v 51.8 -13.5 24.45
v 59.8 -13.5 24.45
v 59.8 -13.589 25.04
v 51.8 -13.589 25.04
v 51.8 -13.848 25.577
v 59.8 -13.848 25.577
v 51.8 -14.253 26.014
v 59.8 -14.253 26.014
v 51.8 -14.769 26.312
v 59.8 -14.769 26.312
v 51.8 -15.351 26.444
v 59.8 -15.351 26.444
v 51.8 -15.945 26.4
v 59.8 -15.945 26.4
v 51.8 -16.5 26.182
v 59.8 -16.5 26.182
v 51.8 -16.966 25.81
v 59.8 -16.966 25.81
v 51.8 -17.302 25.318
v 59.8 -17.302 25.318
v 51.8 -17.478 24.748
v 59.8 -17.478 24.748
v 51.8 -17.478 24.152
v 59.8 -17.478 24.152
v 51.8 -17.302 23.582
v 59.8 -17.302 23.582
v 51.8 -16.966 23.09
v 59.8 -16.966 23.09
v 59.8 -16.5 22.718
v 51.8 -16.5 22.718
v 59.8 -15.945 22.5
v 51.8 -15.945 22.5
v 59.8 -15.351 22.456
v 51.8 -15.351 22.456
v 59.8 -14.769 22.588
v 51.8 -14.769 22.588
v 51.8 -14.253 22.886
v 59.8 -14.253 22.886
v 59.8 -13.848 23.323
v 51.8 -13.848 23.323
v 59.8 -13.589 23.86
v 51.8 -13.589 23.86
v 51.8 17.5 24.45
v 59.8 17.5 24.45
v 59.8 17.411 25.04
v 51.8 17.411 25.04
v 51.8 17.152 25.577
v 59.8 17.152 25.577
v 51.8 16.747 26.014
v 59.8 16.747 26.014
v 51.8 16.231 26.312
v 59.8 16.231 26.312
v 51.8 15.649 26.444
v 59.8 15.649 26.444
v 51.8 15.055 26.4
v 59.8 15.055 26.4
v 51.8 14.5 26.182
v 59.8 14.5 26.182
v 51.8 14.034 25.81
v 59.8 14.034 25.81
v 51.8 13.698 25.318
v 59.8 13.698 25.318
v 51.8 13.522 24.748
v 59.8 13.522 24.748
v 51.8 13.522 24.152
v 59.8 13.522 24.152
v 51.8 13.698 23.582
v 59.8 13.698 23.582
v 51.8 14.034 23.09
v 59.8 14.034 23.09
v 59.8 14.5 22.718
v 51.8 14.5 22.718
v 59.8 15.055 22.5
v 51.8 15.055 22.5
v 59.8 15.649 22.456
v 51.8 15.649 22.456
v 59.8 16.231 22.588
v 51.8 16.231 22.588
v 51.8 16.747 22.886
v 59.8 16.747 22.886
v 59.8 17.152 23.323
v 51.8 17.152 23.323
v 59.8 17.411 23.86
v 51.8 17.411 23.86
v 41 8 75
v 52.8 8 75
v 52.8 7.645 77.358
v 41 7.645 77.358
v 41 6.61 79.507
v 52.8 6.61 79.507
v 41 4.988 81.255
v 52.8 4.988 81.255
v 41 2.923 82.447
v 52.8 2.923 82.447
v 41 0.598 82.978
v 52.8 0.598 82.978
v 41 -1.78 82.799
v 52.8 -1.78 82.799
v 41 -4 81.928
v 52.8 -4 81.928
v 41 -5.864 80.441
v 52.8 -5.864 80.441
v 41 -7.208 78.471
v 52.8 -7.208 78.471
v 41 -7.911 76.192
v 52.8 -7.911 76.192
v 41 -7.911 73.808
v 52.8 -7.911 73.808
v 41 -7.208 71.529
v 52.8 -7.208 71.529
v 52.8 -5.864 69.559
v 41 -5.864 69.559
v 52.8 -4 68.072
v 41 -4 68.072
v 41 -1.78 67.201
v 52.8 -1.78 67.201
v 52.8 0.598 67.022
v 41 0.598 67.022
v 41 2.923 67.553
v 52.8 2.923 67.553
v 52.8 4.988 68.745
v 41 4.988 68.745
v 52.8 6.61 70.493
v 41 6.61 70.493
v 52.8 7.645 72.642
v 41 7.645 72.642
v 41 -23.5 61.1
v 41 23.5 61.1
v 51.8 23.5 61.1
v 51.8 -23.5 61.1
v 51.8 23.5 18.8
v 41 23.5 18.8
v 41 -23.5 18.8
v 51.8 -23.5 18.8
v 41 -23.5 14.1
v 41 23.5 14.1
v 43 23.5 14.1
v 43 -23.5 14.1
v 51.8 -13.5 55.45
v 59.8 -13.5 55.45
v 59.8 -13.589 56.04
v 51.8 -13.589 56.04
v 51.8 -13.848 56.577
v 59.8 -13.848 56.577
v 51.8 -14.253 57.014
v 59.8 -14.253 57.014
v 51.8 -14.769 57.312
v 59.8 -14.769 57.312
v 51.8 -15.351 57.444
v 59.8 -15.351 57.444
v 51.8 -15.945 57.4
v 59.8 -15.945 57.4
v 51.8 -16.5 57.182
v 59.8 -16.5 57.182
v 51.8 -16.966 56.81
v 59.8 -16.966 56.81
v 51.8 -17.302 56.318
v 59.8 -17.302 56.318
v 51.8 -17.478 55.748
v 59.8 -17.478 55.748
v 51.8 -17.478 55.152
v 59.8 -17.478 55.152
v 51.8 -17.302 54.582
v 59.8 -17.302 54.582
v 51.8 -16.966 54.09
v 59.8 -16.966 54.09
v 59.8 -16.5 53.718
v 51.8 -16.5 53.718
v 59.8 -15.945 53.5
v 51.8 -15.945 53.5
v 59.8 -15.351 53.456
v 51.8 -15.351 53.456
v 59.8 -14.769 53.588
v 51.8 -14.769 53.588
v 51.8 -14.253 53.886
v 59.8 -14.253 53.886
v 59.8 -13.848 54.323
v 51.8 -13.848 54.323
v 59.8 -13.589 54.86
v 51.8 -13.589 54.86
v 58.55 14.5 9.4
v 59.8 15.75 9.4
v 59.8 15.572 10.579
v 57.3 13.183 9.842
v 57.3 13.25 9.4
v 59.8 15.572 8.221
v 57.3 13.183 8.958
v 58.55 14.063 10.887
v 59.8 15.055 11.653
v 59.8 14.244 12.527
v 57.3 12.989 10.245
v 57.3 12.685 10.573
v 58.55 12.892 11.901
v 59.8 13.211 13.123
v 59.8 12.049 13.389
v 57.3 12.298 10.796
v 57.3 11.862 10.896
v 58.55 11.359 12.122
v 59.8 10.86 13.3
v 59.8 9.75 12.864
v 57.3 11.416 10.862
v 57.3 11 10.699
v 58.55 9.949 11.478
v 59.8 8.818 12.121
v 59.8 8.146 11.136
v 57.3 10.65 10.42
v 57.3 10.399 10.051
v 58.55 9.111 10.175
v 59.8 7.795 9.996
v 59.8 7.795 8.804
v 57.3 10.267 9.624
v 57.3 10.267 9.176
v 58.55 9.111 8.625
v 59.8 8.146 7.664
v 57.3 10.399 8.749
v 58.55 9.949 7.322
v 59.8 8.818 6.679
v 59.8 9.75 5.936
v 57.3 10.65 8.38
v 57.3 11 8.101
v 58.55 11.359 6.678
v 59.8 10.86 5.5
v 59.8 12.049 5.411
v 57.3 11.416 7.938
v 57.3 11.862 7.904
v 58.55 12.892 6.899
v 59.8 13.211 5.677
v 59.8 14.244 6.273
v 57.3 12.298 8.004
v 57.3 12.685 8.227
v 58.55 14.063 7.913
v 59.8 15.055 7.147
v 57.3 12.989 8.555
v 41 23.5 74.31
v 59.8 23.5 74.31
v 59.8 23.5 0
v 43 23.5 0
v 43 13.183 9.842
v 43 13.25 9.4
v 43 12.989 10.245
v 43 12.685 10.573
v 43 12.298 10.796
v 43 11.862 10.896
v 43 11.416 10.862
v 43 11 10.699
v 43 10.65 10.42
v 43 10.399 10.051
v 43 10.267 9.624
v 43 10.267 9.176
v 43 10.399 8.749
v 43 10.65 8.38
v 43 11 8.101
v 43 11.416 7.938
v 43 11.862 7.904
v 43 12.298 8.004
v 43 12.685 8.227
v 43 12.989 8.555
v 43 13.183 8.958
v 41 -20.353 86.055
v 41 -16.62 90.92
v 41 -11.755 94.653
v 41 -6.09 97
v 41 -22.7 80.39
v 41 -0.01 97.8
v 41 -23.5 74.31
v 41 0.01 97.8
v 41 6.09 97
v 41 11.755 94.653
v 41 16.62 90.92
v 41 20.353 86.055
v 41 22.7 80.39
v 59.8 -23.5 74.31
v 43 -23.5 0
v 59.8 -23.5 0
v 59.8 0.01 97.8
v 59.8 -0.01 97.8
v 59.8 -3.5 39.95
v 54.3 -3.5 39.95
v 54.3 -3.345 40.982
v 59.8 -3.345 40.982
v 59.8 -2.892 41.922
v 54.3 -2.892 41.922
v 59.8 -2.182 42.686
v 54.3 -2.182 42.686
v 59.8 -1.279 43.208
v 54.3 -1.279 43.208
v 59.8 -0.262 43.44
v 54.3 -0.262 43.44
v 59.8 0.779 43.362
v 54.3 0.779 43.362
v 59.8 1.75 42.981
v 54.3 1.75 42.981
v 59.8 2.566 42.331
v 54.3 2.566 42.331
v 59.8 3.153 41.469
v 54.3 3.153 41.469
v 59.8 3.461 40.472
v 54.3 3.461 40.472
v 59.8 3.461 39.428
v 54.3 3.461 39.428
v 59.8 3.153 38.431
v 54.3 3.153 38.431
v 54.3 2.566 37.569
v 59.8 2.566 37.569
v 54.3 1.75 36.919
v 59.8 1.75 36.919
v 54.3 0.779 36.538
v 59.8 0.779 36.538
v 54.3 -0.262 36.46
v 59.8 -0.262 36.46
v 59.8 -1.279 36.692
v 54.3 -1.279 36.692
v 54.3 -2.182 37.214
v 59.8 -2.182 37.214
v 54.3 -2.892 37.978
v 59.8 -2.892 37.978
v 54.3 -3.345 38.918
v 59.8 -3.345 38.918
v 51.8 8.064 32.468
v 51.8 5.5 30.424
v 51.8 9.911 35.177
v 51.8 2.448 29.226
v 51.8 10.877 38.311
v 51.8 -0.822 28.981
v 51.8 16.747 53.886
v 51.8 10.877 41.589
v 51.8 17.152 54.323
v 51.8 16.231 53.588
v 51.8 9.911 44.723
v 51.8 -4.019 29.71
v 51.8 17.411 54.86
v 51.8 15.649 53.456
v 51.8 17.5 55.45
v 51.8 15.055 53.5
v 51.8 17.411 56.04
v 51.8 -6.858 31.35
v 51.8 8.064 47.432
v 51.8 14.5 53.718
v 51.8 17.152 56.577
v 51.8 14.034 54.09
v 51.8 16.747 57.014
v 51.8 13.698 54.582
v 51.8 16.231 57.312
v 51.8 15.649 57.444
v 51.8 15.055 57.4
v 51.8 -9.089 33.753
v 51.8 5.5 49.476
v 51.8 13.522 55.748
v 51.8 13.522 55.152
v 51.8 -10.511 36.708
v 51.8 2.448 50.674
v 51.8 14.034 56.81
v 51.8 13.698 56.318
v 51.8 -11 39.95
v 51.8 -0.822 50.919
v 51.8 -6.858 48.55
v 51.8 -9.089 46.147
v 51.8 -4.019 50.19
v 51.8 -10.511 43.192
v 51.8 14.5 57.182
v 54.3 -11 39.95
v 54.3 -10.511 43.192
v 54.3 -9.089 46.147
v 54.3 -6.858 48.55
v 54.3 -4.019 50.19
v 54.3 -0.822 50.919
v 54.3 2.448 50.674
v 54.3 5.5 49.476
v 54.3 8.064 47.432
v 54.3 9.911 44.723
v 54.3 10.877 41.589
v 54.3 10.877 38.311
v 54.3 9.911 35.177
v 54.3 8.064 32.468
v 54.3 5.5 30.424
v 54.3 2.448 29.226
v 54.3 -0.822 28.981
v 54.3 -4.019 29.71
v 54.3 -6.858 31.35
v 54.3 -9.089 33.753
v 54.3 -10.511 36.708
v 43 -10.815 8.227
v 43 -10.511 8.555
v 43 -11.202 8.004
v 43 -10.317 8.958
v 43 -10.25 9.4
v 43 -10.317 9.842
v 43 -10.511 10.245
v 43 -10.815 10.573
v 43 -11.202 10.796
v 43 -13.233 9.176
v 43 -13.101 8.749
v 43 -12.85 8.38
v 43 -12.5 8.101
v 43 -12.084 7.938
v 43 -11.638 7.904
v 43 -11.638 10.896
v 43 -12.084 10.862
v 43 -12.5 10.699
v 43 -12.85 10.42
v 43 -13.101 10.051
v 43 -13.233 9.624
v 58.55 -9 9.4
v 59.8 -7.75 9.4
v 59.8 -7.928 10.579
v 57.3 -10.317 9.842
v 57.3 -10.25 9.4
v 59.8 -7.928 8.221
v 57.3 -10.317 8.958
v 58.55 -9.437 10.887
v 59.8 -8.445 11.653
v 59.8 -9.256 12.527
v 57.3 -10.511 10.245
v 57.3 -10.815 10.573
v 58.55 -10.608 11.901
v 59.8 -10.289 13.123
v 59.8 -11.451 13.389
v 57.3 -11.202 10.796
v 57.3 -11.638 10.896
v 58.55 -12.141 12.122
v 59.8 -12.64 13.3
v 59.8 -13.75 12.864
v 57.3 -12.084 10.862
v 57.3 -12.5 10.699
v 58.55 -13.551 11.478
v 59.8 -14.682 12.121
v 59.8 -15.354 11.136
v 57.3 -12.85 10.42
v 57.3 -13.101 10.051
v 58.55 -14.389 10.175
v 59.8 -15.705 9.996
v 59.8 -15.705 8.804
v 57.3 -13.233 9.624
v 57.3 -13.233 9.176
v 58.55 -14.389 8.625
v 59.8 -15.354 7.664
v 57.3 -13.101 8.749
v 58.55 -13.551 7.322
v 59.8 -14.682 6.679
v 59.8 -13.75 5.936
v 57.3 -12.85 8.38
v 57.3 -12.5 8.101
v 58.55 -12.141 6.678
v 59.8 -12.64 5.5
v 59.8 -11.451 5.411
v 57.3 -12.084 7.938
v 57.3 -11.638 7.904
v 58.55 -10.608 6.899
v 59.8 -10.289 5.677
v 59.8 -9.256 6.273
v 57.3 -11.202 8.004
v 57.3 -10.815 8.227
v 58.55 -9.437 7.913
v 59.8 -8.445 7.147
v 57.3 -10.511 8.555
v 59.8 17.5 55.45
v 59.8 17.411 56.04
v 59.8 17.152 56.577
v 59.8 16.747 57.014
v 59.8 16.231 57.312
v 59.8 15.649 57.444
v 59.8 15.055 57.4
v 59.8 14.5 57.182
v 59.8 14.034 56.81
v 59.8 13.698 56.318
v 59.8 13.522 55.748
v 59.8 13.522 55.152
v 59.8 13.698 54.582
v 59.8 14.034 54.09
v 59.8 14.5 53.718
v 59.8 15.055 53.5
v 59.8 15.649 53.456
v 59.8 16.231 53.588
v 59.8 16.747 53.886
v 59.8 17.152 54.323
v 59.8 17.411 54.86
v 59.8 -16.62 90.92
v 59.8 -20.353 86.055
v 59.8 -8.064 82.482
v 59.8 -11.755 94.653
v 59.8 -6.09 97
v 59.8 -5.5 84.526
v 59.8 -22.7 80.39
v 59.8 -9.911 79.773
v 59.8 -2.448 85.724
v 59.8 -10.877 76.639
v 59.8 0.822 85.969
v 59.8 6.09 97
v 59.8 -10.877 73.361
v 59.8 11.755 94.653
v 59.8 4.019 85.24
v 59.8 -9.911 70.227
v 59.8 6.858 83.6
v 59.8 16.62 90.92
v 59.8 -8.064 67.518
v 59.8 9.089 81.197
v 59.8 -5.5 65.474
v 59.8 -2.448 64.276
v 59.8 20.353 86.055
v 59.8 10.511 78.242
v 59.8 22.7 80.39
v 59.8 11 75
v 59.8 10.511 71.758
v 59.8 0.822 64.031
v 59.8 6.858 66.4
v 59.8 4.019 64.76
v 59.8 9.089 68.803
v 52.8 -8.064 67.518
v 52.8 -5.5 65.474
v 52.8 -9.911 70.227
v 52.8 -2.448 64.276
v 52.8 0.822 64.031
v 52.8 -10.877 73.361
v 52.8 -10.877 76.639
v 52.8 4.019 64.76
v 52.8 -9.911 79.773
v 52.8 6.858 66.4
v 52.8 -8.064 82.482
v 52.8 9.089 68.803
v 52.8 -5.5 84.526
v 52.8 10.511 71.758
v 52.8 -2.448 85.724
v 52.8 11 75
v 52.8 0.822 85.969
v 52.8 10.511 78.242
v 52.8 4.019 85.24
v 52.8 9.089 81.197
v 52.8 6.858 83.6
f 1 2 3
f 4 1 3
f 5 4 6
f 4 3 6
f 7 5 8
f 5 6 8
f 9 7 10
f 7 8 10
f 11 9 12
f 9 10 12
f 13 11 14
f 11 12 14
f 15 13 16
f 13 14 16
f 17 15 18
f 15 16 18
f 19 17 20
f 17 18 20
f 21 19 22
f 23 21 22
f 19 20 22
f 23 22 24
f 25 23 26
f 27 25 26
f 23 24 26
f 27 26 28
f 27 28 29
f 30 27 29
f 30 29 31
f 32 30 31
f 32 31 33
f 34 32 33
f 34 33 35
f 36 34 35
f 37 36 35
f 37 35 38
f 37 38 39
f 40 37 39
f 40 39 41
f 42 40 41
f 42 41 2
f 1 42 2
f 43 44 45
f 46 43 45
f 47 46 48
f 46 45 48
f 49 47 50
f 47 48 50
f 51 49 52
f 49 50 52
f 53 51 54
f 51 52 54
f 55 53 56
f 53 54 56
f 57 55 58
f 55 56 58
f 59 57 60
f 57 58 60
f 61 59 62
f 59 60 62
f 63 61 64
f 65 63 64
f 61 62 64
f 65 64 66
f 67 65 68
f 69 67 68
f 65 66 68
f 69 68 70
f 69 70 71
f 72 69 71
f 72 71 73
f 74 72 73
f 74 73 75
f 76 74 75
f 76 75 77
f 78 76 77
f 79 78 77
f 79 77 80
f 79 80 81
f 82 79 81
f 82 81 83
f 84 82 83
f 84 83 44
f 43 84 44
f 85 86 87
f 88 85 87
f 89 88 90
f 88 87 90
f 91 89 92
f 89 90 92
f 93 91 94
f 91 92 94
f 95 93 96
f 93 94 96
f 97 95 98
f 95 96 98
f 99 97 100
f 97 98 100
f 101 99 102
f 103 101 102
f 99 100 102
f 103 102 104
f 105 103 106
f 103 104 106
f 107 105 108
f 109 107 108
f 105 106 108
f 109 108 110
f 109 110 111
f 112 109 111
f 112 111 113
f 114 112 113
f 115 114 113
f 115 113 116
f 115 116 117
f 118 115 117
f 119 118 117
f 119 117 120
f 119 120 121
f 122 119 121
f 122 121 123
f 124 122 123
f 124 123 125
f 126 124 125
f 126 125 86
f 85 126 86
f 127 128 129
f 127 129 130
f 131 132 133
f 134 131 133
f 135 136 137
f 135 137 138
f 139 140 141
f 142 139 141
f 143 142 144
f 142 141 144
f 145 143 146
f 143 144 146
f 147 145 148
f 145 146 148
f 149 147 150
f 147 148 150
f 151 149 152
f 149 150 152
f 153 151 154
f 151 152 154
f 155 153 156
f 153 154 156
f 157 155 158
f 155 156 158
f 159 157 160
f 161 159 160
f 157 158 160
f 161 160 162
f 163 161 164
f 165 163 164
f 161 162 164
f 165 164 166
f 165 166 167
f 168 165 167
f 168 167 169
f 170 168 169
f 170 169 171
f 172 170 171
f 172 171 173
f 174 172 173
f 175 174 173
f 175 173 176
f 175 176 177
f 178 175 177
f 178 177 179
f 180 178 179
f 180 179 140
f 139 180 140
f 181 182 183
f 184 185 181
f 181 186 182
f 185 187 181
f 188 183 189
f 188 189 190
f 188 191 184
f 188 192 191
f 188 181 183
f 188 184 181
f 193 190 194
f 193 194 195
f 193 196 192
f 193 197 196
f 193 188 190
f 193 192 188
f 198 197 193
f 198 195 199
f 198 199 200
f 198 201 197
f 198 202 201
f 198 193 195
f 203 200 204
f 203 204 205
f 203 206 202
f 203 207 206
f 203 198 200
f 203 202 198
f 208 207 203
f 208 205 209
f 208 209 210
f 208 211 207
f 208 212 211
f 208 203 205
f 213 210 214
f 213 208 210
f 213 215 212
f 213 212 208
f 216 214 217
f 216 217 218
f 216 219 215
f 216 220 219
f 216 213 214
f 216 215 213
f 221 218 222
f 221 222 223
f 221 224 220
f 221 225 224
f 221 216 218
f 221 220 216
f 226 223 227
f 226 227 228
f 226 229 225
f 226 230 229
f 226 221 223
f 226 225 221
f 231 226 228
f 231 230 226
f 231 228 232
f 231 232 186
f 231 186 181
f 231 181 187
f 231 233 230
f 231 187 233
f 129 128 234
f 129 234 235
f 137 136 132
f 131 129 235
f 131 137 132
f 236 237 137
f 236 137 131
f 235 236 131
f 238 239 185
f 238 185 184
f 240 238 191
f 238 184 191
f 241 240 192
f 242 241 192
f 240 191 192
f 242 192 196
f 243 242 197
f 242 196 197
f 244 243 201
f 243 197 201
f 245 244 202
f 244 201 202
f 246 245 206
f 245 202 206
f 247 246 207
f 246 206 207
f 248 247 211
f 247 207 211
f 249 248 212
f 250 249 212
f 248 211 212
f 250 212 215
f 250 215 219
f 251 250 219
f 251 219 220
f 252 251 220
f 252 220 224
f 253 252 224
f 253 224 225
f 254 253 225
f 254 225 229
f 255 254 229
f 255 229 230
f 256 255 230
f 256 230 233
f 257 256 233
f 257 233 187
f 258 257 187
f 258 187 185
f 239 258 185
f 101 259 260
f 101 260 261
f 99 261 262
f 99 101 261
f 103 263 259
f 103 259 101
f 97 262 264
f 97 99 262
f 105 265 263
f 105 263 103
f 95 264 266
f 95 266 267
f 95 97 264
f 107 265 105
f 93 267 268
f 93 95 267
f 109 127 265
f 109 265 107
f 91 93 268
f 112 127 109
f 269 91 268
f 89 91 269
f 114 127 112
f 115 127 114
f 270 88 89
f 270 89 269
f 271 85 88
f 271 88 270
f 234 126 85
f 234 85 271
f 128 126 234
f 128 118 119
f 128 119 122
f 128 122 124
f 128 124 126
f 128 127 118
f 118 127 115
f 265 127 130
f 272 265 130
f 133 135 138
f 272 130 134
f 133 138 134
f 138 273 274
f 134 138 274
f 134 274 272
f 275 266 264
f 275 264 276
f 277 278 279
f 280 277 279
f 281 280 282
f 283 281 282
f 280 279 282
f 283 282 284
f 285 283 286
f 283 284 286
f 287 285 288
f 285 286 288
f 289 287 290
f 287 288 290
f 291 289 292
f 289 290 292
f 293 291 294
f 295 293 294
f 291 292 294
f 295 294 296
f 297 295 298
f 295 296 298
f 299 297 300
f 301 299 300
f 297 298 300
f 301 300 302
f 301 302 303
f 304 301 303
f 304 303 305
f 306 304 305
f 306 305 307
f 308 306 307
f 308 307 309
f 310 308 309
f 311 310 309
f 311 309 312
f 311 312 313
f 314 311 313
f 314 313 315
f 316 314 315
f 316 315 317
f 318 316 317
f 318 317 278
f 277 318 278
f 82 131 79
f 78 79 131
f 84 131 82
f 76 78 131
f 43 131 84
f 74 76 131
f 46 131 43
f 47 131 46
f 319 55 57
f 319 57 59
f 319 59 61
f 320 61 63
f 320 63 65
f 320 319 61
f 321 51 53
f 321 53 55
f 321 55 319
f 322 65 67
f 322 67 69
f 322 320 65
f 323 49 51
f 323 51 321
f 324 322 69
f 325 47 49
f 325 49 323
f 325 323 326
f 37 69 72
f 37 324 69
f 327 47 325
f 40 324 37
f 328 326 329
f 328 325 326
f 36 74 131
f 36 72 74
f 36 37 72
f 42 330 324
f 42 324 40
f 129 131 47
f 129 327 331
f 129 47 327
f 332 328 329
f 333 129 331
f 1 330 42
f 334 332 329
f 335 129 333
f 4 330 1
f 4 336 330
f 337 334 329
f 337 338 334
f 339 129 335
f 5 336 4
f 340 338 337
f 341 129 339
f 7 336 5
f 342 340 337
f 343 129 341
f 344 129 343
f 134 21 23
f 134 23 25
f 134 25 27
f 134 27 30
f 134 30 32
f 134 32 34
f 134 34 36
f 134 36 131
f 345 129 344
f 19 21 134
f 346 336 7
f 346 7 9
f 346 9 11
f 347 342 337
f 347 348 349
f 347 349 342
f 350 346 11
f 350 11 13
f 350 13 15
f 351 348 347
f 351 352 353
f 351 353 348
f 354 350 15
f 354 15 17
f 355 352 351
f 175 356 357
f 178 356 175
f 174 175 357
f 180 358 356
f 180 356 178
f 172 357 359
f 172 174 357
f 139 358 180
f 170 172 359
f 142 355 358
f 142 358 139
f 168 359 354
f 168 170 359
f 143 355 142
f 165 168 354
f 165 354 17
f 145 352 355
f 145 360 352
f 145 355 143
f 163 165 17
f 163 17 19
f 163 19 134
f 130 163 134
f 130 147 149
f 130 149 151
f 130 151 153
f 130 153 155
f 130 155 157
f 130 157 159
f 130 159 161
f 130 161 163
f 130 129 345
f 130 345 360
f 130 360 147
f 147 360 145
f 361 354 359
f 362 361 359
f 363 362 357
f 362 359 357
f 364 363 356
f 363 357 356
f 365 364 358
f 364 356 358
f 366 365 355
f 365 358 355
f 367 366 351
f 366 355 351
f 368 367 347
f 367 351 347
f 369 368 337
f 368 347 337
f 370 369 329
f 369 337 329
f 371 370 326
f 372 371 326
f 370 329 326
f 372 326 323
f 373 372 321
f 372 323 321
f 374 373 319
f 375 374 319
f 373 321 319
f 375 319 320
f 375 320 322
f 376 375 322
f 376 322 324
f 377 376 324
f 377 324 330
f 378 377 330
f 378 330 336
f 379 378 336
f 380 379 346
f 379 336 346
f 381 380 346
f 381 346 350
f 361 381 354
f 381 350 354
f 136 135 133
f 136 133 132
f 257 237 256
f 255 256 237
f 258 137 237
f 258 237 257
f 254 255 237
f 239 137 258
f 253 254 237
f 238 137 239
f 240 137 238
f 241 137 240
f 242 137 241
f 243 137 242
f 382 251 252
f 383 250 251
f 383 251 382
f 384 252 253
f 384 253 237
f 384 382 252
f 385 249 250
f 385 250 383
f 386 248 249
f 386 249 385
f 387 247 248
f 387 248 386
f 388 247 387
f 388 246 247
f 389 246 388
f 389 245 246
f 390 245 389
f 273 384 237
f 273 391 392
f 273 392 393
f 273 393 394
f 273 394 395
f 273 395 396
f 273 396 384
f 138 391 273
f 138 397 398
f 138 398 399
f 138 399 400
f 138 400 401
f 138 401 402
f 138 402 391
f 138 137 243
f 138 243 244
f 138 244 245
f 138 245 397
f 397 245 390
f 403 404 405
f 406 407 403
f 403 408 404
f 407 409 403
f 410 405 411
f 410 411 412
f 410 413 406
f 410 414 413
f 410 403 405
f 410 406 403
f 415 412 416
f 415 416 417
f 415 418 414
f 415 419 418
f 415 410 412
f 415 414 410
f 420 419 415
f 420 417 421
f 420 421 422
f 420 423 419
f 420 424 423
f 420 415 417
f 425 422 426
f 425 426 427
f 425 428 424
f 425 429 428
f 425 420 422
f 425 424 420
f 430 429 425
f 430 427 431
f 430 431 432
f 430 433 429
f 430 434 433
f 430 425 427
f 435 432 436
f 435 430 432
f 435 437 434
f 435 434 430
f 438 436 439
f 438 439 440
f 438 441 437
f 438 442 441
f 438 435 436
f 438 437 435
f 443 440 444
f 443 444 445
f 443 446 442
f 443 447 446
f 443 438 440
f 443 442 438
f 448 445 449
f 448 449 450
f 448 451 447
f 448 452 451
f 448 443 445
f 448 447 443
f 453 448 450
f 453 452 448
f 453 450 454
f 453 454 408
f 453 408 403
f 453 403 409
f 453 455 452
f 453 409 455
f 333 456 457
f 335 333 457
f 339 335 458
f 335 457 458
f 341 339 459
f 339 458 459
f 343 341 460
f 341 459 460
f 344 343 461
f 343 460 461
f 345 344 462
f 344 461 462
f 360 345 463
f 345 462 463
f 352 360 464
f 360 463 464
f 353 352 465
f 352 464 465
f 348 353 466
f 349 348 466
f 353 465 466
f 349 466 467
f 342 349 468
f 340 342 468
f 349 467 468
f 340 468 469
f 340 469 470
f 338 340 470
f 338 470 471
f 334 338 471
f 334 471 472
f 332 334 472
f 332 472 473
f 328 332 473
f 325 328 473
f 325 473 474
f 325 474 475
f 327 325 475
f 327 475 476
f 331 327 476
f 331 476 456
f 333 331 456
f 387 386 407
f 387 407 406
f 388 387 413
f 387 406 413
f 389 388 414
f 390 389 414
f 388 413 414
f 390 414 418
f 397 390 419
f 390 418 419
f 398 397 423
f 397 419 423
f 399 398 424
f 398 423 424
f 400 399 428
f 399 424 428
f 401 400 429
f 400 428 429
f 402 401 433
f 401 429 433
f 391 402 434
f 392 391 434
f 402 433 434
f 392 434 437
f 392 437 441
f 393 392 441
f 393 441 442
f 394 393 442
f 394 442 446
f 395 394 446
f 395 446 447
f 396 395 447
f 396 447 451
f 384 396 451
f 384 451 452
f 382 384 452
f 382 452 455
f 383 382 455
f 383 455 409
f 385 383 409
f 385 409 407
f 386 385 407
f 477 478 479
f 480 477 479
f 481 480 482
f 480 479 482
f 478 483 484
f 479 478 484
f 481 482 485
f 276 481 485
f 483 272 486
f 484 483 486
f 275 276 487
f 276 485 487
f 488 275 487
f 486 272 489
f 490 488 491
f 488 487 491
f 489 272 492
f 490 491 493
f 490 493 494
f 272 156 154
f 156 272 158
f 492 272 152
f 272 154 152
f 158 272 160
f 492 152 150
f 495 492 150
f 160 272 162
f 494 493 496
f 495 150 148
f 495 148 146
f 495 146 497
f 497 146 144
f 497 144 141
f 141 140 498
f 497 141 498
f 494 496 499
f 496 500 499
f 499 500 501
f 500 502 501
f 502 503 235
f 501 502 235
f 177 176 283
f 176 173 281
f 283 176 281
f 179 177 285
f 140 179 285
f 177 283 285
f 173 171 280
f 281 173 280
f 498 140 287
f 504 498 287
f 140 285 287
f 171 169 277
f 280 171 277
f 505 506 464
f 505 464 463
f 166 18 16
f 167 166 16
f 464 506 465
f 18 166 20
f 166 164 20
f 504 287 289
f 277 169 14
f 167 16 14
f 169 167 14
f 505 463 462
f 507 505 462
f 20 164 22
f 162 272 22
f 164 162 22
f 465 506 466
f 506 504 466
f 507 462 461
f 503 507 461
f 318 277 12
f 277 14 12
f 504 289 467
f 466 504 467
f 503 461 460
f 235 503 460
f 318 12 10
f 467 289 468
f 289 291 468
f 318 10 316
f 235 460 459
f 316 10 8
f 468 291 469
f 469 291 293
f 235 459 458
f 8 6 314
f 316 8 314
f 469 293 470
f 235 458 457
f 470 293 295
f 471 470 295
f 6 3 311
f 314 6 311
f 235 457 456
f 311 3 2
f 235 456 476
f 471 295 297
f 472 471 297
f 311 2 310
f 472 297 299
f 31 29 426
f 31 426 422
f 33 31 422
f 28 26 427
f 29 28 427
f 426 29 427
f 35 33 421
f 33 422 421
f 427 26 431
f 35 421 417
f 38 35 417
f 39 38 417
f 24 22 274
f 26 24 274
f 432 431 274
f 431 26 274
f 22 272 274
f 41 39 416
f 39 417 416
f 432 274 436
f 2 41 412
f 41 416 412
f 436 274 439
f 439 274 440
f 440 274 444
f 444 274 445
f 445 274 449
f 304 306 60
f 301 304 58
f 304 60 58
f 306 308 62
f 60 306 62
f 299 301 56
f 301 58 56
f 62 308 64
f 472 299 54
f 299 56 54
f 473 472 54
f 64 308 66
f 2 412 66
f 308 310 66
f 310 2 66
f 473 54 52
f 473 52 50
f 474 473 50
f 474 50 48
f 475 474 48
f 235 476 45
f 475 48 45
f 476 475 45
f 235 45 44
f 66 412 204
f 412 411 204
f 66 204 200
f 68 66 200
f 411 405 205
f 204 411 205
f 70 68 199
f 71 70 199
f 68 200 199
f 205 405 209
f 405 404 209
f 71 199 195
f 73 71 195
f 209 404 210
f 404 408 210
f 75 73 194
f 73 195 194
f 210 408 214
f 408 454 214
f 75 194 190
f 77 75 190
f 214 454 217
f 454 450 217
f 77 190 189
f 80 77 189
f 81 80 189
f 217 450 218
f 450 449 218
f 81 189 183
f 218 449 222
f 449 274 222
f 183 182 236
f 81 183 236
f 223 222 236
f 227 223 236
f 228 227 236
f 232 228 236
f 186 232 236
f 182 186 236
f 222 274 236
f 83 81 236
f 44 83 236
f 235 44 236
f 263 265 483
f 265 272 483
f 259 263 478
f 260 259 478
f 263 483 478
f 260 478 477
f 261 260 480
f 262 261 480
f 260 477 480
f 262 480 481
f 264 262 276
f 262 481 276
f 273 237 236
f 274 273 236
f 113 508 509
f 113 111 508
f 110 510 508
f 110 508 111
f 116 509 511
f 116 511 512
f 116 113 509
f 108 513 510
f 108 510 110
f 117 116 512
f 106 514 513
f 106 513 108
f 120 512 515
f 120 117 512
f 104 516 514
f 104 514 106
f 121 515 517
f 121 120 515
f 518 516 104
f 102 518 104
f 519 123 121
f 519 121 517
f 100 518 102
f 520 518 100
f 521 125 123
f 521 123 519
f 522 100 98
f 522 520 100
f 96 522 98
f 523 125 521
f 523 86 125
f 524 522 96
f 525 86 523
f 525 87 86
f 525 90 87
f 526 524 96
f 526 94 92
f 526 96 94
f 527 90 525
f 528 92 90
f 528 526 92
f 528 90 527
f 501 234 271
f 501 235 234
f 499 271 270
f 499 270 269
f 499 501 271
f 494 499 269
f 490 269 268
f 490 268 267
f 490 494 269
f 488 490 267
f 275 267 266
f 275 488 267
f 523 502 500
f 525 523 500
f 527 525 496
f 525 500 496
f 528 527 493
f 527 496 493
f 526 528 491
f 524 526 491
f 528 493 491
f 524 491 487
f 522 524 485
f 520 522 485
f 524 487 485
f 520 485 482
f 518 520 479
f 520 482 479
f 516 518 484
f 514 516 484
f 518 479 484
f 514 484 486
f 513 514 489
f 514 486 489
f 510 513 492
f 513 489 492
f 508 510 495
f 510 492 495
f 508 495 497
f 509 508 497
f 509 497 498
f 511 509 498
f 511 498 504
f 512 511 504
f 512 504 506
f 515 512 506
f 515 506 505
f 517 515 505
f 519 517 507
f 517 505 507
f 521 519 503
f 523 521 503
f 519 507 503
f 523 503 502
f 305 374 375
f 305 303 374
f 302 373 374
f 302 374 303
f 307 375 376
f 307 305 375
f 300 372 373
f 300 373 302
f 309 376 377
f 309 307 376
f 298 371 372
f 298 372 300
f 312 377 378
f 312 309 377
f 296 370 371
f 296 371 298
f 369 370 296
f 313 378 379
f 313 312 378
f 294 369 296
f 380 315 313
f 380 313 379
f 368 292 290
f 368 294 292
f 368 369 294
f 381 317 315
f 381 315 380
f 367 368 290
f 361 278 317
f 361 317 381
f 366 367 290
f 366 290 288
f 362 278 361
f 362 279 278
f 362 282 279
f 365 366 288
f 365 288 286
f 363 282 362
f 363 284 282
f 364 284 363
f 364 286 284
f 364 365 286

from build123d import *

# Parameters (mm, degrees)
SKETCH011_W     = 18.8
SKETCH011_H     = 47
PAD007_DEPTH    = 97.8
SKETCH025_R     = 2
POCKET007_DEPTH = 18.8
SKETCH026_W     = 47
SKETCH026_H     = 42.3
POCKET008_DEPTH = 10.8
SKETCH027_R     = 11
POCKET009_DEPTH = 2.5
SKETCH028_R     = 3.5
POCKET010_DEPTH = 18.801
SKETCH030_W     = 47
SKETCH030_H     = 14.1
POCKET011_DEPTH = 2
SKETCH056_R     = 8
POCKET023_DEPTH = 18.801
SKETCH057_R     = 11
POCKET024_DEPTH = 7
FILLET002_R     = 23.49
SKETCH074_R     = 1.5
POCKET029_DEPTH = 18.801
CHAMFER003_SIZE = 2.5


with BuildPart() as part:
    # Sketch011 (on DatumPlane) → Pad007 (new body)
    with BuildSketch(Plane.XY):
        with Locations((50.4, 0)):
            Rectangle(SKETCH011_W, SKETCH011_H)
    extrude(amount=PAD007_DEPTH)

    # Sketch025 (on Face4 of Pad007) → Pocket007 (cut)
    with BuildSketch(Plane.YZ.offset(59.8)):
        with Locations((-15.5, 55.45)):
            Circle(SKETCH025_R)
        with Locations((15.5, 55.45)):
            Circle(SKETCH025_R)
        with Locations((-15.5, 24.45)):
            Circle(SKETCH025_R)
        with Locations((15.5, 24.45)):
            Circle(SKETCH025_R)
    extrude(amount=-POCKET007_DEPTH, mode=Mode.SUBTRACT)

    # Sketch026 (on Face2 of Pad007) → Pocket008 (cut)
    with BuildSketch(Plane(origin=(41, 0, 0), x_dir=(0, -1, 0), z_dir=(-1, 0, 0))):
        with Locations((0, 39.95)):
            Rectangle(SKETCH026_W, SKETCH026_H)
    extrude(amount=-POCKET008_DEPTH, mode=Mode.SUBTRACT)

    # Sketch027 (on Face5 of Pocket008) → Pocket009 (cut)
    with BuildSketch(Plane(origin=(51.8, 0, 0), x_dir=(0, -1, 0), z_dir=(-1, 0, 0))):
        with Locations((0, 39.95)):
            Circle(SKETCH027_R)
    extrude(amount=-POCKET009_DEPTH, mode=Mode.SUBTRACT)

    # Sketch028 (on Face7 of Pocket009) → Pocket010 (cut, through all)
    with BuildSketch(Plane(origin=(41, 0, 0), x_dir=(0, -1, 0), z_dir=(-1, 0, 0))):
        with Locations((0, 39.95)):
            Circle(SKETCH028_R)
    extrude(amount=-POCKET010_DEPTH, mode=Mode.SUBTRACT)

    # Sketch030 (on Face3 of Pocket007) → Pocket011 (cut)
    with BuildSketch(Plane(origin=(41, 0, 0), x_dir=(0, -1, 0), z_dir=(-1, 0, 0))):
        with Locations((0, 7.05)):
            Rectangle(SKETCH030_W, SKETCH030_H)
    extrude(amount=-POCKET011_DEPTH, mode=Mode.SUBTRACT)

    # Sketch056 (on Face11 of Pocket011) → Pocket023 (cut, through all)
    with BuildSketch(Plane.YZ.offset(59.8)):
        with Locations((0, 75)):
            Circle(SKETCH056_R)
    extrude(amount=-POCKET023_DEPTH, mode=Mode.SUBTRACT)

    # Sketch057 (on Face11 of Pocket023) → Pocket024 (cut)
    with BuildSketch(Plane.YZ.offset(59.8)):
        with Locations((0, 75)):
            Circle(SKETCH057_R)
    extrude(amount=-POCKET024_DEPTH, mode=Mode.SUBTRACT)

    # Fillet002
    fillet002_edges = [part.edges().sort_by_distance(p)[0] for p in [
        (50.4, 23.5, 97.8),
        (50.4, -23.5, 97.8),
    ]]
    fillet(fillet002_edges, radius=FILLET002_R)

    # Sketch074 (on Face5 of Fillet002) → Pocket029 (cut, through all)
    with BuildSketch(Plane.YZ.offset(59.8)):
        with Locations((-11.75, 9.4)):
            Circle(SKETCH074_R)
        with Locations((11.75, 9.4)):
            Circle(SKETCH074_R)
    extrude(amount=-POCKET029_DEPTH, mode=Mode.SUBTRACT)

    # Chamfer003
    chamfer003_edges = [part.edges().sort_by_distance(p)[0] for p in [
        (59.8, 10.25, 9.4),
        (59.8, -13.25, 9.4),
    ]]
    chamfer(chamfer003_edges, length=CHAMFER003_SIZE)


solid = part.part
